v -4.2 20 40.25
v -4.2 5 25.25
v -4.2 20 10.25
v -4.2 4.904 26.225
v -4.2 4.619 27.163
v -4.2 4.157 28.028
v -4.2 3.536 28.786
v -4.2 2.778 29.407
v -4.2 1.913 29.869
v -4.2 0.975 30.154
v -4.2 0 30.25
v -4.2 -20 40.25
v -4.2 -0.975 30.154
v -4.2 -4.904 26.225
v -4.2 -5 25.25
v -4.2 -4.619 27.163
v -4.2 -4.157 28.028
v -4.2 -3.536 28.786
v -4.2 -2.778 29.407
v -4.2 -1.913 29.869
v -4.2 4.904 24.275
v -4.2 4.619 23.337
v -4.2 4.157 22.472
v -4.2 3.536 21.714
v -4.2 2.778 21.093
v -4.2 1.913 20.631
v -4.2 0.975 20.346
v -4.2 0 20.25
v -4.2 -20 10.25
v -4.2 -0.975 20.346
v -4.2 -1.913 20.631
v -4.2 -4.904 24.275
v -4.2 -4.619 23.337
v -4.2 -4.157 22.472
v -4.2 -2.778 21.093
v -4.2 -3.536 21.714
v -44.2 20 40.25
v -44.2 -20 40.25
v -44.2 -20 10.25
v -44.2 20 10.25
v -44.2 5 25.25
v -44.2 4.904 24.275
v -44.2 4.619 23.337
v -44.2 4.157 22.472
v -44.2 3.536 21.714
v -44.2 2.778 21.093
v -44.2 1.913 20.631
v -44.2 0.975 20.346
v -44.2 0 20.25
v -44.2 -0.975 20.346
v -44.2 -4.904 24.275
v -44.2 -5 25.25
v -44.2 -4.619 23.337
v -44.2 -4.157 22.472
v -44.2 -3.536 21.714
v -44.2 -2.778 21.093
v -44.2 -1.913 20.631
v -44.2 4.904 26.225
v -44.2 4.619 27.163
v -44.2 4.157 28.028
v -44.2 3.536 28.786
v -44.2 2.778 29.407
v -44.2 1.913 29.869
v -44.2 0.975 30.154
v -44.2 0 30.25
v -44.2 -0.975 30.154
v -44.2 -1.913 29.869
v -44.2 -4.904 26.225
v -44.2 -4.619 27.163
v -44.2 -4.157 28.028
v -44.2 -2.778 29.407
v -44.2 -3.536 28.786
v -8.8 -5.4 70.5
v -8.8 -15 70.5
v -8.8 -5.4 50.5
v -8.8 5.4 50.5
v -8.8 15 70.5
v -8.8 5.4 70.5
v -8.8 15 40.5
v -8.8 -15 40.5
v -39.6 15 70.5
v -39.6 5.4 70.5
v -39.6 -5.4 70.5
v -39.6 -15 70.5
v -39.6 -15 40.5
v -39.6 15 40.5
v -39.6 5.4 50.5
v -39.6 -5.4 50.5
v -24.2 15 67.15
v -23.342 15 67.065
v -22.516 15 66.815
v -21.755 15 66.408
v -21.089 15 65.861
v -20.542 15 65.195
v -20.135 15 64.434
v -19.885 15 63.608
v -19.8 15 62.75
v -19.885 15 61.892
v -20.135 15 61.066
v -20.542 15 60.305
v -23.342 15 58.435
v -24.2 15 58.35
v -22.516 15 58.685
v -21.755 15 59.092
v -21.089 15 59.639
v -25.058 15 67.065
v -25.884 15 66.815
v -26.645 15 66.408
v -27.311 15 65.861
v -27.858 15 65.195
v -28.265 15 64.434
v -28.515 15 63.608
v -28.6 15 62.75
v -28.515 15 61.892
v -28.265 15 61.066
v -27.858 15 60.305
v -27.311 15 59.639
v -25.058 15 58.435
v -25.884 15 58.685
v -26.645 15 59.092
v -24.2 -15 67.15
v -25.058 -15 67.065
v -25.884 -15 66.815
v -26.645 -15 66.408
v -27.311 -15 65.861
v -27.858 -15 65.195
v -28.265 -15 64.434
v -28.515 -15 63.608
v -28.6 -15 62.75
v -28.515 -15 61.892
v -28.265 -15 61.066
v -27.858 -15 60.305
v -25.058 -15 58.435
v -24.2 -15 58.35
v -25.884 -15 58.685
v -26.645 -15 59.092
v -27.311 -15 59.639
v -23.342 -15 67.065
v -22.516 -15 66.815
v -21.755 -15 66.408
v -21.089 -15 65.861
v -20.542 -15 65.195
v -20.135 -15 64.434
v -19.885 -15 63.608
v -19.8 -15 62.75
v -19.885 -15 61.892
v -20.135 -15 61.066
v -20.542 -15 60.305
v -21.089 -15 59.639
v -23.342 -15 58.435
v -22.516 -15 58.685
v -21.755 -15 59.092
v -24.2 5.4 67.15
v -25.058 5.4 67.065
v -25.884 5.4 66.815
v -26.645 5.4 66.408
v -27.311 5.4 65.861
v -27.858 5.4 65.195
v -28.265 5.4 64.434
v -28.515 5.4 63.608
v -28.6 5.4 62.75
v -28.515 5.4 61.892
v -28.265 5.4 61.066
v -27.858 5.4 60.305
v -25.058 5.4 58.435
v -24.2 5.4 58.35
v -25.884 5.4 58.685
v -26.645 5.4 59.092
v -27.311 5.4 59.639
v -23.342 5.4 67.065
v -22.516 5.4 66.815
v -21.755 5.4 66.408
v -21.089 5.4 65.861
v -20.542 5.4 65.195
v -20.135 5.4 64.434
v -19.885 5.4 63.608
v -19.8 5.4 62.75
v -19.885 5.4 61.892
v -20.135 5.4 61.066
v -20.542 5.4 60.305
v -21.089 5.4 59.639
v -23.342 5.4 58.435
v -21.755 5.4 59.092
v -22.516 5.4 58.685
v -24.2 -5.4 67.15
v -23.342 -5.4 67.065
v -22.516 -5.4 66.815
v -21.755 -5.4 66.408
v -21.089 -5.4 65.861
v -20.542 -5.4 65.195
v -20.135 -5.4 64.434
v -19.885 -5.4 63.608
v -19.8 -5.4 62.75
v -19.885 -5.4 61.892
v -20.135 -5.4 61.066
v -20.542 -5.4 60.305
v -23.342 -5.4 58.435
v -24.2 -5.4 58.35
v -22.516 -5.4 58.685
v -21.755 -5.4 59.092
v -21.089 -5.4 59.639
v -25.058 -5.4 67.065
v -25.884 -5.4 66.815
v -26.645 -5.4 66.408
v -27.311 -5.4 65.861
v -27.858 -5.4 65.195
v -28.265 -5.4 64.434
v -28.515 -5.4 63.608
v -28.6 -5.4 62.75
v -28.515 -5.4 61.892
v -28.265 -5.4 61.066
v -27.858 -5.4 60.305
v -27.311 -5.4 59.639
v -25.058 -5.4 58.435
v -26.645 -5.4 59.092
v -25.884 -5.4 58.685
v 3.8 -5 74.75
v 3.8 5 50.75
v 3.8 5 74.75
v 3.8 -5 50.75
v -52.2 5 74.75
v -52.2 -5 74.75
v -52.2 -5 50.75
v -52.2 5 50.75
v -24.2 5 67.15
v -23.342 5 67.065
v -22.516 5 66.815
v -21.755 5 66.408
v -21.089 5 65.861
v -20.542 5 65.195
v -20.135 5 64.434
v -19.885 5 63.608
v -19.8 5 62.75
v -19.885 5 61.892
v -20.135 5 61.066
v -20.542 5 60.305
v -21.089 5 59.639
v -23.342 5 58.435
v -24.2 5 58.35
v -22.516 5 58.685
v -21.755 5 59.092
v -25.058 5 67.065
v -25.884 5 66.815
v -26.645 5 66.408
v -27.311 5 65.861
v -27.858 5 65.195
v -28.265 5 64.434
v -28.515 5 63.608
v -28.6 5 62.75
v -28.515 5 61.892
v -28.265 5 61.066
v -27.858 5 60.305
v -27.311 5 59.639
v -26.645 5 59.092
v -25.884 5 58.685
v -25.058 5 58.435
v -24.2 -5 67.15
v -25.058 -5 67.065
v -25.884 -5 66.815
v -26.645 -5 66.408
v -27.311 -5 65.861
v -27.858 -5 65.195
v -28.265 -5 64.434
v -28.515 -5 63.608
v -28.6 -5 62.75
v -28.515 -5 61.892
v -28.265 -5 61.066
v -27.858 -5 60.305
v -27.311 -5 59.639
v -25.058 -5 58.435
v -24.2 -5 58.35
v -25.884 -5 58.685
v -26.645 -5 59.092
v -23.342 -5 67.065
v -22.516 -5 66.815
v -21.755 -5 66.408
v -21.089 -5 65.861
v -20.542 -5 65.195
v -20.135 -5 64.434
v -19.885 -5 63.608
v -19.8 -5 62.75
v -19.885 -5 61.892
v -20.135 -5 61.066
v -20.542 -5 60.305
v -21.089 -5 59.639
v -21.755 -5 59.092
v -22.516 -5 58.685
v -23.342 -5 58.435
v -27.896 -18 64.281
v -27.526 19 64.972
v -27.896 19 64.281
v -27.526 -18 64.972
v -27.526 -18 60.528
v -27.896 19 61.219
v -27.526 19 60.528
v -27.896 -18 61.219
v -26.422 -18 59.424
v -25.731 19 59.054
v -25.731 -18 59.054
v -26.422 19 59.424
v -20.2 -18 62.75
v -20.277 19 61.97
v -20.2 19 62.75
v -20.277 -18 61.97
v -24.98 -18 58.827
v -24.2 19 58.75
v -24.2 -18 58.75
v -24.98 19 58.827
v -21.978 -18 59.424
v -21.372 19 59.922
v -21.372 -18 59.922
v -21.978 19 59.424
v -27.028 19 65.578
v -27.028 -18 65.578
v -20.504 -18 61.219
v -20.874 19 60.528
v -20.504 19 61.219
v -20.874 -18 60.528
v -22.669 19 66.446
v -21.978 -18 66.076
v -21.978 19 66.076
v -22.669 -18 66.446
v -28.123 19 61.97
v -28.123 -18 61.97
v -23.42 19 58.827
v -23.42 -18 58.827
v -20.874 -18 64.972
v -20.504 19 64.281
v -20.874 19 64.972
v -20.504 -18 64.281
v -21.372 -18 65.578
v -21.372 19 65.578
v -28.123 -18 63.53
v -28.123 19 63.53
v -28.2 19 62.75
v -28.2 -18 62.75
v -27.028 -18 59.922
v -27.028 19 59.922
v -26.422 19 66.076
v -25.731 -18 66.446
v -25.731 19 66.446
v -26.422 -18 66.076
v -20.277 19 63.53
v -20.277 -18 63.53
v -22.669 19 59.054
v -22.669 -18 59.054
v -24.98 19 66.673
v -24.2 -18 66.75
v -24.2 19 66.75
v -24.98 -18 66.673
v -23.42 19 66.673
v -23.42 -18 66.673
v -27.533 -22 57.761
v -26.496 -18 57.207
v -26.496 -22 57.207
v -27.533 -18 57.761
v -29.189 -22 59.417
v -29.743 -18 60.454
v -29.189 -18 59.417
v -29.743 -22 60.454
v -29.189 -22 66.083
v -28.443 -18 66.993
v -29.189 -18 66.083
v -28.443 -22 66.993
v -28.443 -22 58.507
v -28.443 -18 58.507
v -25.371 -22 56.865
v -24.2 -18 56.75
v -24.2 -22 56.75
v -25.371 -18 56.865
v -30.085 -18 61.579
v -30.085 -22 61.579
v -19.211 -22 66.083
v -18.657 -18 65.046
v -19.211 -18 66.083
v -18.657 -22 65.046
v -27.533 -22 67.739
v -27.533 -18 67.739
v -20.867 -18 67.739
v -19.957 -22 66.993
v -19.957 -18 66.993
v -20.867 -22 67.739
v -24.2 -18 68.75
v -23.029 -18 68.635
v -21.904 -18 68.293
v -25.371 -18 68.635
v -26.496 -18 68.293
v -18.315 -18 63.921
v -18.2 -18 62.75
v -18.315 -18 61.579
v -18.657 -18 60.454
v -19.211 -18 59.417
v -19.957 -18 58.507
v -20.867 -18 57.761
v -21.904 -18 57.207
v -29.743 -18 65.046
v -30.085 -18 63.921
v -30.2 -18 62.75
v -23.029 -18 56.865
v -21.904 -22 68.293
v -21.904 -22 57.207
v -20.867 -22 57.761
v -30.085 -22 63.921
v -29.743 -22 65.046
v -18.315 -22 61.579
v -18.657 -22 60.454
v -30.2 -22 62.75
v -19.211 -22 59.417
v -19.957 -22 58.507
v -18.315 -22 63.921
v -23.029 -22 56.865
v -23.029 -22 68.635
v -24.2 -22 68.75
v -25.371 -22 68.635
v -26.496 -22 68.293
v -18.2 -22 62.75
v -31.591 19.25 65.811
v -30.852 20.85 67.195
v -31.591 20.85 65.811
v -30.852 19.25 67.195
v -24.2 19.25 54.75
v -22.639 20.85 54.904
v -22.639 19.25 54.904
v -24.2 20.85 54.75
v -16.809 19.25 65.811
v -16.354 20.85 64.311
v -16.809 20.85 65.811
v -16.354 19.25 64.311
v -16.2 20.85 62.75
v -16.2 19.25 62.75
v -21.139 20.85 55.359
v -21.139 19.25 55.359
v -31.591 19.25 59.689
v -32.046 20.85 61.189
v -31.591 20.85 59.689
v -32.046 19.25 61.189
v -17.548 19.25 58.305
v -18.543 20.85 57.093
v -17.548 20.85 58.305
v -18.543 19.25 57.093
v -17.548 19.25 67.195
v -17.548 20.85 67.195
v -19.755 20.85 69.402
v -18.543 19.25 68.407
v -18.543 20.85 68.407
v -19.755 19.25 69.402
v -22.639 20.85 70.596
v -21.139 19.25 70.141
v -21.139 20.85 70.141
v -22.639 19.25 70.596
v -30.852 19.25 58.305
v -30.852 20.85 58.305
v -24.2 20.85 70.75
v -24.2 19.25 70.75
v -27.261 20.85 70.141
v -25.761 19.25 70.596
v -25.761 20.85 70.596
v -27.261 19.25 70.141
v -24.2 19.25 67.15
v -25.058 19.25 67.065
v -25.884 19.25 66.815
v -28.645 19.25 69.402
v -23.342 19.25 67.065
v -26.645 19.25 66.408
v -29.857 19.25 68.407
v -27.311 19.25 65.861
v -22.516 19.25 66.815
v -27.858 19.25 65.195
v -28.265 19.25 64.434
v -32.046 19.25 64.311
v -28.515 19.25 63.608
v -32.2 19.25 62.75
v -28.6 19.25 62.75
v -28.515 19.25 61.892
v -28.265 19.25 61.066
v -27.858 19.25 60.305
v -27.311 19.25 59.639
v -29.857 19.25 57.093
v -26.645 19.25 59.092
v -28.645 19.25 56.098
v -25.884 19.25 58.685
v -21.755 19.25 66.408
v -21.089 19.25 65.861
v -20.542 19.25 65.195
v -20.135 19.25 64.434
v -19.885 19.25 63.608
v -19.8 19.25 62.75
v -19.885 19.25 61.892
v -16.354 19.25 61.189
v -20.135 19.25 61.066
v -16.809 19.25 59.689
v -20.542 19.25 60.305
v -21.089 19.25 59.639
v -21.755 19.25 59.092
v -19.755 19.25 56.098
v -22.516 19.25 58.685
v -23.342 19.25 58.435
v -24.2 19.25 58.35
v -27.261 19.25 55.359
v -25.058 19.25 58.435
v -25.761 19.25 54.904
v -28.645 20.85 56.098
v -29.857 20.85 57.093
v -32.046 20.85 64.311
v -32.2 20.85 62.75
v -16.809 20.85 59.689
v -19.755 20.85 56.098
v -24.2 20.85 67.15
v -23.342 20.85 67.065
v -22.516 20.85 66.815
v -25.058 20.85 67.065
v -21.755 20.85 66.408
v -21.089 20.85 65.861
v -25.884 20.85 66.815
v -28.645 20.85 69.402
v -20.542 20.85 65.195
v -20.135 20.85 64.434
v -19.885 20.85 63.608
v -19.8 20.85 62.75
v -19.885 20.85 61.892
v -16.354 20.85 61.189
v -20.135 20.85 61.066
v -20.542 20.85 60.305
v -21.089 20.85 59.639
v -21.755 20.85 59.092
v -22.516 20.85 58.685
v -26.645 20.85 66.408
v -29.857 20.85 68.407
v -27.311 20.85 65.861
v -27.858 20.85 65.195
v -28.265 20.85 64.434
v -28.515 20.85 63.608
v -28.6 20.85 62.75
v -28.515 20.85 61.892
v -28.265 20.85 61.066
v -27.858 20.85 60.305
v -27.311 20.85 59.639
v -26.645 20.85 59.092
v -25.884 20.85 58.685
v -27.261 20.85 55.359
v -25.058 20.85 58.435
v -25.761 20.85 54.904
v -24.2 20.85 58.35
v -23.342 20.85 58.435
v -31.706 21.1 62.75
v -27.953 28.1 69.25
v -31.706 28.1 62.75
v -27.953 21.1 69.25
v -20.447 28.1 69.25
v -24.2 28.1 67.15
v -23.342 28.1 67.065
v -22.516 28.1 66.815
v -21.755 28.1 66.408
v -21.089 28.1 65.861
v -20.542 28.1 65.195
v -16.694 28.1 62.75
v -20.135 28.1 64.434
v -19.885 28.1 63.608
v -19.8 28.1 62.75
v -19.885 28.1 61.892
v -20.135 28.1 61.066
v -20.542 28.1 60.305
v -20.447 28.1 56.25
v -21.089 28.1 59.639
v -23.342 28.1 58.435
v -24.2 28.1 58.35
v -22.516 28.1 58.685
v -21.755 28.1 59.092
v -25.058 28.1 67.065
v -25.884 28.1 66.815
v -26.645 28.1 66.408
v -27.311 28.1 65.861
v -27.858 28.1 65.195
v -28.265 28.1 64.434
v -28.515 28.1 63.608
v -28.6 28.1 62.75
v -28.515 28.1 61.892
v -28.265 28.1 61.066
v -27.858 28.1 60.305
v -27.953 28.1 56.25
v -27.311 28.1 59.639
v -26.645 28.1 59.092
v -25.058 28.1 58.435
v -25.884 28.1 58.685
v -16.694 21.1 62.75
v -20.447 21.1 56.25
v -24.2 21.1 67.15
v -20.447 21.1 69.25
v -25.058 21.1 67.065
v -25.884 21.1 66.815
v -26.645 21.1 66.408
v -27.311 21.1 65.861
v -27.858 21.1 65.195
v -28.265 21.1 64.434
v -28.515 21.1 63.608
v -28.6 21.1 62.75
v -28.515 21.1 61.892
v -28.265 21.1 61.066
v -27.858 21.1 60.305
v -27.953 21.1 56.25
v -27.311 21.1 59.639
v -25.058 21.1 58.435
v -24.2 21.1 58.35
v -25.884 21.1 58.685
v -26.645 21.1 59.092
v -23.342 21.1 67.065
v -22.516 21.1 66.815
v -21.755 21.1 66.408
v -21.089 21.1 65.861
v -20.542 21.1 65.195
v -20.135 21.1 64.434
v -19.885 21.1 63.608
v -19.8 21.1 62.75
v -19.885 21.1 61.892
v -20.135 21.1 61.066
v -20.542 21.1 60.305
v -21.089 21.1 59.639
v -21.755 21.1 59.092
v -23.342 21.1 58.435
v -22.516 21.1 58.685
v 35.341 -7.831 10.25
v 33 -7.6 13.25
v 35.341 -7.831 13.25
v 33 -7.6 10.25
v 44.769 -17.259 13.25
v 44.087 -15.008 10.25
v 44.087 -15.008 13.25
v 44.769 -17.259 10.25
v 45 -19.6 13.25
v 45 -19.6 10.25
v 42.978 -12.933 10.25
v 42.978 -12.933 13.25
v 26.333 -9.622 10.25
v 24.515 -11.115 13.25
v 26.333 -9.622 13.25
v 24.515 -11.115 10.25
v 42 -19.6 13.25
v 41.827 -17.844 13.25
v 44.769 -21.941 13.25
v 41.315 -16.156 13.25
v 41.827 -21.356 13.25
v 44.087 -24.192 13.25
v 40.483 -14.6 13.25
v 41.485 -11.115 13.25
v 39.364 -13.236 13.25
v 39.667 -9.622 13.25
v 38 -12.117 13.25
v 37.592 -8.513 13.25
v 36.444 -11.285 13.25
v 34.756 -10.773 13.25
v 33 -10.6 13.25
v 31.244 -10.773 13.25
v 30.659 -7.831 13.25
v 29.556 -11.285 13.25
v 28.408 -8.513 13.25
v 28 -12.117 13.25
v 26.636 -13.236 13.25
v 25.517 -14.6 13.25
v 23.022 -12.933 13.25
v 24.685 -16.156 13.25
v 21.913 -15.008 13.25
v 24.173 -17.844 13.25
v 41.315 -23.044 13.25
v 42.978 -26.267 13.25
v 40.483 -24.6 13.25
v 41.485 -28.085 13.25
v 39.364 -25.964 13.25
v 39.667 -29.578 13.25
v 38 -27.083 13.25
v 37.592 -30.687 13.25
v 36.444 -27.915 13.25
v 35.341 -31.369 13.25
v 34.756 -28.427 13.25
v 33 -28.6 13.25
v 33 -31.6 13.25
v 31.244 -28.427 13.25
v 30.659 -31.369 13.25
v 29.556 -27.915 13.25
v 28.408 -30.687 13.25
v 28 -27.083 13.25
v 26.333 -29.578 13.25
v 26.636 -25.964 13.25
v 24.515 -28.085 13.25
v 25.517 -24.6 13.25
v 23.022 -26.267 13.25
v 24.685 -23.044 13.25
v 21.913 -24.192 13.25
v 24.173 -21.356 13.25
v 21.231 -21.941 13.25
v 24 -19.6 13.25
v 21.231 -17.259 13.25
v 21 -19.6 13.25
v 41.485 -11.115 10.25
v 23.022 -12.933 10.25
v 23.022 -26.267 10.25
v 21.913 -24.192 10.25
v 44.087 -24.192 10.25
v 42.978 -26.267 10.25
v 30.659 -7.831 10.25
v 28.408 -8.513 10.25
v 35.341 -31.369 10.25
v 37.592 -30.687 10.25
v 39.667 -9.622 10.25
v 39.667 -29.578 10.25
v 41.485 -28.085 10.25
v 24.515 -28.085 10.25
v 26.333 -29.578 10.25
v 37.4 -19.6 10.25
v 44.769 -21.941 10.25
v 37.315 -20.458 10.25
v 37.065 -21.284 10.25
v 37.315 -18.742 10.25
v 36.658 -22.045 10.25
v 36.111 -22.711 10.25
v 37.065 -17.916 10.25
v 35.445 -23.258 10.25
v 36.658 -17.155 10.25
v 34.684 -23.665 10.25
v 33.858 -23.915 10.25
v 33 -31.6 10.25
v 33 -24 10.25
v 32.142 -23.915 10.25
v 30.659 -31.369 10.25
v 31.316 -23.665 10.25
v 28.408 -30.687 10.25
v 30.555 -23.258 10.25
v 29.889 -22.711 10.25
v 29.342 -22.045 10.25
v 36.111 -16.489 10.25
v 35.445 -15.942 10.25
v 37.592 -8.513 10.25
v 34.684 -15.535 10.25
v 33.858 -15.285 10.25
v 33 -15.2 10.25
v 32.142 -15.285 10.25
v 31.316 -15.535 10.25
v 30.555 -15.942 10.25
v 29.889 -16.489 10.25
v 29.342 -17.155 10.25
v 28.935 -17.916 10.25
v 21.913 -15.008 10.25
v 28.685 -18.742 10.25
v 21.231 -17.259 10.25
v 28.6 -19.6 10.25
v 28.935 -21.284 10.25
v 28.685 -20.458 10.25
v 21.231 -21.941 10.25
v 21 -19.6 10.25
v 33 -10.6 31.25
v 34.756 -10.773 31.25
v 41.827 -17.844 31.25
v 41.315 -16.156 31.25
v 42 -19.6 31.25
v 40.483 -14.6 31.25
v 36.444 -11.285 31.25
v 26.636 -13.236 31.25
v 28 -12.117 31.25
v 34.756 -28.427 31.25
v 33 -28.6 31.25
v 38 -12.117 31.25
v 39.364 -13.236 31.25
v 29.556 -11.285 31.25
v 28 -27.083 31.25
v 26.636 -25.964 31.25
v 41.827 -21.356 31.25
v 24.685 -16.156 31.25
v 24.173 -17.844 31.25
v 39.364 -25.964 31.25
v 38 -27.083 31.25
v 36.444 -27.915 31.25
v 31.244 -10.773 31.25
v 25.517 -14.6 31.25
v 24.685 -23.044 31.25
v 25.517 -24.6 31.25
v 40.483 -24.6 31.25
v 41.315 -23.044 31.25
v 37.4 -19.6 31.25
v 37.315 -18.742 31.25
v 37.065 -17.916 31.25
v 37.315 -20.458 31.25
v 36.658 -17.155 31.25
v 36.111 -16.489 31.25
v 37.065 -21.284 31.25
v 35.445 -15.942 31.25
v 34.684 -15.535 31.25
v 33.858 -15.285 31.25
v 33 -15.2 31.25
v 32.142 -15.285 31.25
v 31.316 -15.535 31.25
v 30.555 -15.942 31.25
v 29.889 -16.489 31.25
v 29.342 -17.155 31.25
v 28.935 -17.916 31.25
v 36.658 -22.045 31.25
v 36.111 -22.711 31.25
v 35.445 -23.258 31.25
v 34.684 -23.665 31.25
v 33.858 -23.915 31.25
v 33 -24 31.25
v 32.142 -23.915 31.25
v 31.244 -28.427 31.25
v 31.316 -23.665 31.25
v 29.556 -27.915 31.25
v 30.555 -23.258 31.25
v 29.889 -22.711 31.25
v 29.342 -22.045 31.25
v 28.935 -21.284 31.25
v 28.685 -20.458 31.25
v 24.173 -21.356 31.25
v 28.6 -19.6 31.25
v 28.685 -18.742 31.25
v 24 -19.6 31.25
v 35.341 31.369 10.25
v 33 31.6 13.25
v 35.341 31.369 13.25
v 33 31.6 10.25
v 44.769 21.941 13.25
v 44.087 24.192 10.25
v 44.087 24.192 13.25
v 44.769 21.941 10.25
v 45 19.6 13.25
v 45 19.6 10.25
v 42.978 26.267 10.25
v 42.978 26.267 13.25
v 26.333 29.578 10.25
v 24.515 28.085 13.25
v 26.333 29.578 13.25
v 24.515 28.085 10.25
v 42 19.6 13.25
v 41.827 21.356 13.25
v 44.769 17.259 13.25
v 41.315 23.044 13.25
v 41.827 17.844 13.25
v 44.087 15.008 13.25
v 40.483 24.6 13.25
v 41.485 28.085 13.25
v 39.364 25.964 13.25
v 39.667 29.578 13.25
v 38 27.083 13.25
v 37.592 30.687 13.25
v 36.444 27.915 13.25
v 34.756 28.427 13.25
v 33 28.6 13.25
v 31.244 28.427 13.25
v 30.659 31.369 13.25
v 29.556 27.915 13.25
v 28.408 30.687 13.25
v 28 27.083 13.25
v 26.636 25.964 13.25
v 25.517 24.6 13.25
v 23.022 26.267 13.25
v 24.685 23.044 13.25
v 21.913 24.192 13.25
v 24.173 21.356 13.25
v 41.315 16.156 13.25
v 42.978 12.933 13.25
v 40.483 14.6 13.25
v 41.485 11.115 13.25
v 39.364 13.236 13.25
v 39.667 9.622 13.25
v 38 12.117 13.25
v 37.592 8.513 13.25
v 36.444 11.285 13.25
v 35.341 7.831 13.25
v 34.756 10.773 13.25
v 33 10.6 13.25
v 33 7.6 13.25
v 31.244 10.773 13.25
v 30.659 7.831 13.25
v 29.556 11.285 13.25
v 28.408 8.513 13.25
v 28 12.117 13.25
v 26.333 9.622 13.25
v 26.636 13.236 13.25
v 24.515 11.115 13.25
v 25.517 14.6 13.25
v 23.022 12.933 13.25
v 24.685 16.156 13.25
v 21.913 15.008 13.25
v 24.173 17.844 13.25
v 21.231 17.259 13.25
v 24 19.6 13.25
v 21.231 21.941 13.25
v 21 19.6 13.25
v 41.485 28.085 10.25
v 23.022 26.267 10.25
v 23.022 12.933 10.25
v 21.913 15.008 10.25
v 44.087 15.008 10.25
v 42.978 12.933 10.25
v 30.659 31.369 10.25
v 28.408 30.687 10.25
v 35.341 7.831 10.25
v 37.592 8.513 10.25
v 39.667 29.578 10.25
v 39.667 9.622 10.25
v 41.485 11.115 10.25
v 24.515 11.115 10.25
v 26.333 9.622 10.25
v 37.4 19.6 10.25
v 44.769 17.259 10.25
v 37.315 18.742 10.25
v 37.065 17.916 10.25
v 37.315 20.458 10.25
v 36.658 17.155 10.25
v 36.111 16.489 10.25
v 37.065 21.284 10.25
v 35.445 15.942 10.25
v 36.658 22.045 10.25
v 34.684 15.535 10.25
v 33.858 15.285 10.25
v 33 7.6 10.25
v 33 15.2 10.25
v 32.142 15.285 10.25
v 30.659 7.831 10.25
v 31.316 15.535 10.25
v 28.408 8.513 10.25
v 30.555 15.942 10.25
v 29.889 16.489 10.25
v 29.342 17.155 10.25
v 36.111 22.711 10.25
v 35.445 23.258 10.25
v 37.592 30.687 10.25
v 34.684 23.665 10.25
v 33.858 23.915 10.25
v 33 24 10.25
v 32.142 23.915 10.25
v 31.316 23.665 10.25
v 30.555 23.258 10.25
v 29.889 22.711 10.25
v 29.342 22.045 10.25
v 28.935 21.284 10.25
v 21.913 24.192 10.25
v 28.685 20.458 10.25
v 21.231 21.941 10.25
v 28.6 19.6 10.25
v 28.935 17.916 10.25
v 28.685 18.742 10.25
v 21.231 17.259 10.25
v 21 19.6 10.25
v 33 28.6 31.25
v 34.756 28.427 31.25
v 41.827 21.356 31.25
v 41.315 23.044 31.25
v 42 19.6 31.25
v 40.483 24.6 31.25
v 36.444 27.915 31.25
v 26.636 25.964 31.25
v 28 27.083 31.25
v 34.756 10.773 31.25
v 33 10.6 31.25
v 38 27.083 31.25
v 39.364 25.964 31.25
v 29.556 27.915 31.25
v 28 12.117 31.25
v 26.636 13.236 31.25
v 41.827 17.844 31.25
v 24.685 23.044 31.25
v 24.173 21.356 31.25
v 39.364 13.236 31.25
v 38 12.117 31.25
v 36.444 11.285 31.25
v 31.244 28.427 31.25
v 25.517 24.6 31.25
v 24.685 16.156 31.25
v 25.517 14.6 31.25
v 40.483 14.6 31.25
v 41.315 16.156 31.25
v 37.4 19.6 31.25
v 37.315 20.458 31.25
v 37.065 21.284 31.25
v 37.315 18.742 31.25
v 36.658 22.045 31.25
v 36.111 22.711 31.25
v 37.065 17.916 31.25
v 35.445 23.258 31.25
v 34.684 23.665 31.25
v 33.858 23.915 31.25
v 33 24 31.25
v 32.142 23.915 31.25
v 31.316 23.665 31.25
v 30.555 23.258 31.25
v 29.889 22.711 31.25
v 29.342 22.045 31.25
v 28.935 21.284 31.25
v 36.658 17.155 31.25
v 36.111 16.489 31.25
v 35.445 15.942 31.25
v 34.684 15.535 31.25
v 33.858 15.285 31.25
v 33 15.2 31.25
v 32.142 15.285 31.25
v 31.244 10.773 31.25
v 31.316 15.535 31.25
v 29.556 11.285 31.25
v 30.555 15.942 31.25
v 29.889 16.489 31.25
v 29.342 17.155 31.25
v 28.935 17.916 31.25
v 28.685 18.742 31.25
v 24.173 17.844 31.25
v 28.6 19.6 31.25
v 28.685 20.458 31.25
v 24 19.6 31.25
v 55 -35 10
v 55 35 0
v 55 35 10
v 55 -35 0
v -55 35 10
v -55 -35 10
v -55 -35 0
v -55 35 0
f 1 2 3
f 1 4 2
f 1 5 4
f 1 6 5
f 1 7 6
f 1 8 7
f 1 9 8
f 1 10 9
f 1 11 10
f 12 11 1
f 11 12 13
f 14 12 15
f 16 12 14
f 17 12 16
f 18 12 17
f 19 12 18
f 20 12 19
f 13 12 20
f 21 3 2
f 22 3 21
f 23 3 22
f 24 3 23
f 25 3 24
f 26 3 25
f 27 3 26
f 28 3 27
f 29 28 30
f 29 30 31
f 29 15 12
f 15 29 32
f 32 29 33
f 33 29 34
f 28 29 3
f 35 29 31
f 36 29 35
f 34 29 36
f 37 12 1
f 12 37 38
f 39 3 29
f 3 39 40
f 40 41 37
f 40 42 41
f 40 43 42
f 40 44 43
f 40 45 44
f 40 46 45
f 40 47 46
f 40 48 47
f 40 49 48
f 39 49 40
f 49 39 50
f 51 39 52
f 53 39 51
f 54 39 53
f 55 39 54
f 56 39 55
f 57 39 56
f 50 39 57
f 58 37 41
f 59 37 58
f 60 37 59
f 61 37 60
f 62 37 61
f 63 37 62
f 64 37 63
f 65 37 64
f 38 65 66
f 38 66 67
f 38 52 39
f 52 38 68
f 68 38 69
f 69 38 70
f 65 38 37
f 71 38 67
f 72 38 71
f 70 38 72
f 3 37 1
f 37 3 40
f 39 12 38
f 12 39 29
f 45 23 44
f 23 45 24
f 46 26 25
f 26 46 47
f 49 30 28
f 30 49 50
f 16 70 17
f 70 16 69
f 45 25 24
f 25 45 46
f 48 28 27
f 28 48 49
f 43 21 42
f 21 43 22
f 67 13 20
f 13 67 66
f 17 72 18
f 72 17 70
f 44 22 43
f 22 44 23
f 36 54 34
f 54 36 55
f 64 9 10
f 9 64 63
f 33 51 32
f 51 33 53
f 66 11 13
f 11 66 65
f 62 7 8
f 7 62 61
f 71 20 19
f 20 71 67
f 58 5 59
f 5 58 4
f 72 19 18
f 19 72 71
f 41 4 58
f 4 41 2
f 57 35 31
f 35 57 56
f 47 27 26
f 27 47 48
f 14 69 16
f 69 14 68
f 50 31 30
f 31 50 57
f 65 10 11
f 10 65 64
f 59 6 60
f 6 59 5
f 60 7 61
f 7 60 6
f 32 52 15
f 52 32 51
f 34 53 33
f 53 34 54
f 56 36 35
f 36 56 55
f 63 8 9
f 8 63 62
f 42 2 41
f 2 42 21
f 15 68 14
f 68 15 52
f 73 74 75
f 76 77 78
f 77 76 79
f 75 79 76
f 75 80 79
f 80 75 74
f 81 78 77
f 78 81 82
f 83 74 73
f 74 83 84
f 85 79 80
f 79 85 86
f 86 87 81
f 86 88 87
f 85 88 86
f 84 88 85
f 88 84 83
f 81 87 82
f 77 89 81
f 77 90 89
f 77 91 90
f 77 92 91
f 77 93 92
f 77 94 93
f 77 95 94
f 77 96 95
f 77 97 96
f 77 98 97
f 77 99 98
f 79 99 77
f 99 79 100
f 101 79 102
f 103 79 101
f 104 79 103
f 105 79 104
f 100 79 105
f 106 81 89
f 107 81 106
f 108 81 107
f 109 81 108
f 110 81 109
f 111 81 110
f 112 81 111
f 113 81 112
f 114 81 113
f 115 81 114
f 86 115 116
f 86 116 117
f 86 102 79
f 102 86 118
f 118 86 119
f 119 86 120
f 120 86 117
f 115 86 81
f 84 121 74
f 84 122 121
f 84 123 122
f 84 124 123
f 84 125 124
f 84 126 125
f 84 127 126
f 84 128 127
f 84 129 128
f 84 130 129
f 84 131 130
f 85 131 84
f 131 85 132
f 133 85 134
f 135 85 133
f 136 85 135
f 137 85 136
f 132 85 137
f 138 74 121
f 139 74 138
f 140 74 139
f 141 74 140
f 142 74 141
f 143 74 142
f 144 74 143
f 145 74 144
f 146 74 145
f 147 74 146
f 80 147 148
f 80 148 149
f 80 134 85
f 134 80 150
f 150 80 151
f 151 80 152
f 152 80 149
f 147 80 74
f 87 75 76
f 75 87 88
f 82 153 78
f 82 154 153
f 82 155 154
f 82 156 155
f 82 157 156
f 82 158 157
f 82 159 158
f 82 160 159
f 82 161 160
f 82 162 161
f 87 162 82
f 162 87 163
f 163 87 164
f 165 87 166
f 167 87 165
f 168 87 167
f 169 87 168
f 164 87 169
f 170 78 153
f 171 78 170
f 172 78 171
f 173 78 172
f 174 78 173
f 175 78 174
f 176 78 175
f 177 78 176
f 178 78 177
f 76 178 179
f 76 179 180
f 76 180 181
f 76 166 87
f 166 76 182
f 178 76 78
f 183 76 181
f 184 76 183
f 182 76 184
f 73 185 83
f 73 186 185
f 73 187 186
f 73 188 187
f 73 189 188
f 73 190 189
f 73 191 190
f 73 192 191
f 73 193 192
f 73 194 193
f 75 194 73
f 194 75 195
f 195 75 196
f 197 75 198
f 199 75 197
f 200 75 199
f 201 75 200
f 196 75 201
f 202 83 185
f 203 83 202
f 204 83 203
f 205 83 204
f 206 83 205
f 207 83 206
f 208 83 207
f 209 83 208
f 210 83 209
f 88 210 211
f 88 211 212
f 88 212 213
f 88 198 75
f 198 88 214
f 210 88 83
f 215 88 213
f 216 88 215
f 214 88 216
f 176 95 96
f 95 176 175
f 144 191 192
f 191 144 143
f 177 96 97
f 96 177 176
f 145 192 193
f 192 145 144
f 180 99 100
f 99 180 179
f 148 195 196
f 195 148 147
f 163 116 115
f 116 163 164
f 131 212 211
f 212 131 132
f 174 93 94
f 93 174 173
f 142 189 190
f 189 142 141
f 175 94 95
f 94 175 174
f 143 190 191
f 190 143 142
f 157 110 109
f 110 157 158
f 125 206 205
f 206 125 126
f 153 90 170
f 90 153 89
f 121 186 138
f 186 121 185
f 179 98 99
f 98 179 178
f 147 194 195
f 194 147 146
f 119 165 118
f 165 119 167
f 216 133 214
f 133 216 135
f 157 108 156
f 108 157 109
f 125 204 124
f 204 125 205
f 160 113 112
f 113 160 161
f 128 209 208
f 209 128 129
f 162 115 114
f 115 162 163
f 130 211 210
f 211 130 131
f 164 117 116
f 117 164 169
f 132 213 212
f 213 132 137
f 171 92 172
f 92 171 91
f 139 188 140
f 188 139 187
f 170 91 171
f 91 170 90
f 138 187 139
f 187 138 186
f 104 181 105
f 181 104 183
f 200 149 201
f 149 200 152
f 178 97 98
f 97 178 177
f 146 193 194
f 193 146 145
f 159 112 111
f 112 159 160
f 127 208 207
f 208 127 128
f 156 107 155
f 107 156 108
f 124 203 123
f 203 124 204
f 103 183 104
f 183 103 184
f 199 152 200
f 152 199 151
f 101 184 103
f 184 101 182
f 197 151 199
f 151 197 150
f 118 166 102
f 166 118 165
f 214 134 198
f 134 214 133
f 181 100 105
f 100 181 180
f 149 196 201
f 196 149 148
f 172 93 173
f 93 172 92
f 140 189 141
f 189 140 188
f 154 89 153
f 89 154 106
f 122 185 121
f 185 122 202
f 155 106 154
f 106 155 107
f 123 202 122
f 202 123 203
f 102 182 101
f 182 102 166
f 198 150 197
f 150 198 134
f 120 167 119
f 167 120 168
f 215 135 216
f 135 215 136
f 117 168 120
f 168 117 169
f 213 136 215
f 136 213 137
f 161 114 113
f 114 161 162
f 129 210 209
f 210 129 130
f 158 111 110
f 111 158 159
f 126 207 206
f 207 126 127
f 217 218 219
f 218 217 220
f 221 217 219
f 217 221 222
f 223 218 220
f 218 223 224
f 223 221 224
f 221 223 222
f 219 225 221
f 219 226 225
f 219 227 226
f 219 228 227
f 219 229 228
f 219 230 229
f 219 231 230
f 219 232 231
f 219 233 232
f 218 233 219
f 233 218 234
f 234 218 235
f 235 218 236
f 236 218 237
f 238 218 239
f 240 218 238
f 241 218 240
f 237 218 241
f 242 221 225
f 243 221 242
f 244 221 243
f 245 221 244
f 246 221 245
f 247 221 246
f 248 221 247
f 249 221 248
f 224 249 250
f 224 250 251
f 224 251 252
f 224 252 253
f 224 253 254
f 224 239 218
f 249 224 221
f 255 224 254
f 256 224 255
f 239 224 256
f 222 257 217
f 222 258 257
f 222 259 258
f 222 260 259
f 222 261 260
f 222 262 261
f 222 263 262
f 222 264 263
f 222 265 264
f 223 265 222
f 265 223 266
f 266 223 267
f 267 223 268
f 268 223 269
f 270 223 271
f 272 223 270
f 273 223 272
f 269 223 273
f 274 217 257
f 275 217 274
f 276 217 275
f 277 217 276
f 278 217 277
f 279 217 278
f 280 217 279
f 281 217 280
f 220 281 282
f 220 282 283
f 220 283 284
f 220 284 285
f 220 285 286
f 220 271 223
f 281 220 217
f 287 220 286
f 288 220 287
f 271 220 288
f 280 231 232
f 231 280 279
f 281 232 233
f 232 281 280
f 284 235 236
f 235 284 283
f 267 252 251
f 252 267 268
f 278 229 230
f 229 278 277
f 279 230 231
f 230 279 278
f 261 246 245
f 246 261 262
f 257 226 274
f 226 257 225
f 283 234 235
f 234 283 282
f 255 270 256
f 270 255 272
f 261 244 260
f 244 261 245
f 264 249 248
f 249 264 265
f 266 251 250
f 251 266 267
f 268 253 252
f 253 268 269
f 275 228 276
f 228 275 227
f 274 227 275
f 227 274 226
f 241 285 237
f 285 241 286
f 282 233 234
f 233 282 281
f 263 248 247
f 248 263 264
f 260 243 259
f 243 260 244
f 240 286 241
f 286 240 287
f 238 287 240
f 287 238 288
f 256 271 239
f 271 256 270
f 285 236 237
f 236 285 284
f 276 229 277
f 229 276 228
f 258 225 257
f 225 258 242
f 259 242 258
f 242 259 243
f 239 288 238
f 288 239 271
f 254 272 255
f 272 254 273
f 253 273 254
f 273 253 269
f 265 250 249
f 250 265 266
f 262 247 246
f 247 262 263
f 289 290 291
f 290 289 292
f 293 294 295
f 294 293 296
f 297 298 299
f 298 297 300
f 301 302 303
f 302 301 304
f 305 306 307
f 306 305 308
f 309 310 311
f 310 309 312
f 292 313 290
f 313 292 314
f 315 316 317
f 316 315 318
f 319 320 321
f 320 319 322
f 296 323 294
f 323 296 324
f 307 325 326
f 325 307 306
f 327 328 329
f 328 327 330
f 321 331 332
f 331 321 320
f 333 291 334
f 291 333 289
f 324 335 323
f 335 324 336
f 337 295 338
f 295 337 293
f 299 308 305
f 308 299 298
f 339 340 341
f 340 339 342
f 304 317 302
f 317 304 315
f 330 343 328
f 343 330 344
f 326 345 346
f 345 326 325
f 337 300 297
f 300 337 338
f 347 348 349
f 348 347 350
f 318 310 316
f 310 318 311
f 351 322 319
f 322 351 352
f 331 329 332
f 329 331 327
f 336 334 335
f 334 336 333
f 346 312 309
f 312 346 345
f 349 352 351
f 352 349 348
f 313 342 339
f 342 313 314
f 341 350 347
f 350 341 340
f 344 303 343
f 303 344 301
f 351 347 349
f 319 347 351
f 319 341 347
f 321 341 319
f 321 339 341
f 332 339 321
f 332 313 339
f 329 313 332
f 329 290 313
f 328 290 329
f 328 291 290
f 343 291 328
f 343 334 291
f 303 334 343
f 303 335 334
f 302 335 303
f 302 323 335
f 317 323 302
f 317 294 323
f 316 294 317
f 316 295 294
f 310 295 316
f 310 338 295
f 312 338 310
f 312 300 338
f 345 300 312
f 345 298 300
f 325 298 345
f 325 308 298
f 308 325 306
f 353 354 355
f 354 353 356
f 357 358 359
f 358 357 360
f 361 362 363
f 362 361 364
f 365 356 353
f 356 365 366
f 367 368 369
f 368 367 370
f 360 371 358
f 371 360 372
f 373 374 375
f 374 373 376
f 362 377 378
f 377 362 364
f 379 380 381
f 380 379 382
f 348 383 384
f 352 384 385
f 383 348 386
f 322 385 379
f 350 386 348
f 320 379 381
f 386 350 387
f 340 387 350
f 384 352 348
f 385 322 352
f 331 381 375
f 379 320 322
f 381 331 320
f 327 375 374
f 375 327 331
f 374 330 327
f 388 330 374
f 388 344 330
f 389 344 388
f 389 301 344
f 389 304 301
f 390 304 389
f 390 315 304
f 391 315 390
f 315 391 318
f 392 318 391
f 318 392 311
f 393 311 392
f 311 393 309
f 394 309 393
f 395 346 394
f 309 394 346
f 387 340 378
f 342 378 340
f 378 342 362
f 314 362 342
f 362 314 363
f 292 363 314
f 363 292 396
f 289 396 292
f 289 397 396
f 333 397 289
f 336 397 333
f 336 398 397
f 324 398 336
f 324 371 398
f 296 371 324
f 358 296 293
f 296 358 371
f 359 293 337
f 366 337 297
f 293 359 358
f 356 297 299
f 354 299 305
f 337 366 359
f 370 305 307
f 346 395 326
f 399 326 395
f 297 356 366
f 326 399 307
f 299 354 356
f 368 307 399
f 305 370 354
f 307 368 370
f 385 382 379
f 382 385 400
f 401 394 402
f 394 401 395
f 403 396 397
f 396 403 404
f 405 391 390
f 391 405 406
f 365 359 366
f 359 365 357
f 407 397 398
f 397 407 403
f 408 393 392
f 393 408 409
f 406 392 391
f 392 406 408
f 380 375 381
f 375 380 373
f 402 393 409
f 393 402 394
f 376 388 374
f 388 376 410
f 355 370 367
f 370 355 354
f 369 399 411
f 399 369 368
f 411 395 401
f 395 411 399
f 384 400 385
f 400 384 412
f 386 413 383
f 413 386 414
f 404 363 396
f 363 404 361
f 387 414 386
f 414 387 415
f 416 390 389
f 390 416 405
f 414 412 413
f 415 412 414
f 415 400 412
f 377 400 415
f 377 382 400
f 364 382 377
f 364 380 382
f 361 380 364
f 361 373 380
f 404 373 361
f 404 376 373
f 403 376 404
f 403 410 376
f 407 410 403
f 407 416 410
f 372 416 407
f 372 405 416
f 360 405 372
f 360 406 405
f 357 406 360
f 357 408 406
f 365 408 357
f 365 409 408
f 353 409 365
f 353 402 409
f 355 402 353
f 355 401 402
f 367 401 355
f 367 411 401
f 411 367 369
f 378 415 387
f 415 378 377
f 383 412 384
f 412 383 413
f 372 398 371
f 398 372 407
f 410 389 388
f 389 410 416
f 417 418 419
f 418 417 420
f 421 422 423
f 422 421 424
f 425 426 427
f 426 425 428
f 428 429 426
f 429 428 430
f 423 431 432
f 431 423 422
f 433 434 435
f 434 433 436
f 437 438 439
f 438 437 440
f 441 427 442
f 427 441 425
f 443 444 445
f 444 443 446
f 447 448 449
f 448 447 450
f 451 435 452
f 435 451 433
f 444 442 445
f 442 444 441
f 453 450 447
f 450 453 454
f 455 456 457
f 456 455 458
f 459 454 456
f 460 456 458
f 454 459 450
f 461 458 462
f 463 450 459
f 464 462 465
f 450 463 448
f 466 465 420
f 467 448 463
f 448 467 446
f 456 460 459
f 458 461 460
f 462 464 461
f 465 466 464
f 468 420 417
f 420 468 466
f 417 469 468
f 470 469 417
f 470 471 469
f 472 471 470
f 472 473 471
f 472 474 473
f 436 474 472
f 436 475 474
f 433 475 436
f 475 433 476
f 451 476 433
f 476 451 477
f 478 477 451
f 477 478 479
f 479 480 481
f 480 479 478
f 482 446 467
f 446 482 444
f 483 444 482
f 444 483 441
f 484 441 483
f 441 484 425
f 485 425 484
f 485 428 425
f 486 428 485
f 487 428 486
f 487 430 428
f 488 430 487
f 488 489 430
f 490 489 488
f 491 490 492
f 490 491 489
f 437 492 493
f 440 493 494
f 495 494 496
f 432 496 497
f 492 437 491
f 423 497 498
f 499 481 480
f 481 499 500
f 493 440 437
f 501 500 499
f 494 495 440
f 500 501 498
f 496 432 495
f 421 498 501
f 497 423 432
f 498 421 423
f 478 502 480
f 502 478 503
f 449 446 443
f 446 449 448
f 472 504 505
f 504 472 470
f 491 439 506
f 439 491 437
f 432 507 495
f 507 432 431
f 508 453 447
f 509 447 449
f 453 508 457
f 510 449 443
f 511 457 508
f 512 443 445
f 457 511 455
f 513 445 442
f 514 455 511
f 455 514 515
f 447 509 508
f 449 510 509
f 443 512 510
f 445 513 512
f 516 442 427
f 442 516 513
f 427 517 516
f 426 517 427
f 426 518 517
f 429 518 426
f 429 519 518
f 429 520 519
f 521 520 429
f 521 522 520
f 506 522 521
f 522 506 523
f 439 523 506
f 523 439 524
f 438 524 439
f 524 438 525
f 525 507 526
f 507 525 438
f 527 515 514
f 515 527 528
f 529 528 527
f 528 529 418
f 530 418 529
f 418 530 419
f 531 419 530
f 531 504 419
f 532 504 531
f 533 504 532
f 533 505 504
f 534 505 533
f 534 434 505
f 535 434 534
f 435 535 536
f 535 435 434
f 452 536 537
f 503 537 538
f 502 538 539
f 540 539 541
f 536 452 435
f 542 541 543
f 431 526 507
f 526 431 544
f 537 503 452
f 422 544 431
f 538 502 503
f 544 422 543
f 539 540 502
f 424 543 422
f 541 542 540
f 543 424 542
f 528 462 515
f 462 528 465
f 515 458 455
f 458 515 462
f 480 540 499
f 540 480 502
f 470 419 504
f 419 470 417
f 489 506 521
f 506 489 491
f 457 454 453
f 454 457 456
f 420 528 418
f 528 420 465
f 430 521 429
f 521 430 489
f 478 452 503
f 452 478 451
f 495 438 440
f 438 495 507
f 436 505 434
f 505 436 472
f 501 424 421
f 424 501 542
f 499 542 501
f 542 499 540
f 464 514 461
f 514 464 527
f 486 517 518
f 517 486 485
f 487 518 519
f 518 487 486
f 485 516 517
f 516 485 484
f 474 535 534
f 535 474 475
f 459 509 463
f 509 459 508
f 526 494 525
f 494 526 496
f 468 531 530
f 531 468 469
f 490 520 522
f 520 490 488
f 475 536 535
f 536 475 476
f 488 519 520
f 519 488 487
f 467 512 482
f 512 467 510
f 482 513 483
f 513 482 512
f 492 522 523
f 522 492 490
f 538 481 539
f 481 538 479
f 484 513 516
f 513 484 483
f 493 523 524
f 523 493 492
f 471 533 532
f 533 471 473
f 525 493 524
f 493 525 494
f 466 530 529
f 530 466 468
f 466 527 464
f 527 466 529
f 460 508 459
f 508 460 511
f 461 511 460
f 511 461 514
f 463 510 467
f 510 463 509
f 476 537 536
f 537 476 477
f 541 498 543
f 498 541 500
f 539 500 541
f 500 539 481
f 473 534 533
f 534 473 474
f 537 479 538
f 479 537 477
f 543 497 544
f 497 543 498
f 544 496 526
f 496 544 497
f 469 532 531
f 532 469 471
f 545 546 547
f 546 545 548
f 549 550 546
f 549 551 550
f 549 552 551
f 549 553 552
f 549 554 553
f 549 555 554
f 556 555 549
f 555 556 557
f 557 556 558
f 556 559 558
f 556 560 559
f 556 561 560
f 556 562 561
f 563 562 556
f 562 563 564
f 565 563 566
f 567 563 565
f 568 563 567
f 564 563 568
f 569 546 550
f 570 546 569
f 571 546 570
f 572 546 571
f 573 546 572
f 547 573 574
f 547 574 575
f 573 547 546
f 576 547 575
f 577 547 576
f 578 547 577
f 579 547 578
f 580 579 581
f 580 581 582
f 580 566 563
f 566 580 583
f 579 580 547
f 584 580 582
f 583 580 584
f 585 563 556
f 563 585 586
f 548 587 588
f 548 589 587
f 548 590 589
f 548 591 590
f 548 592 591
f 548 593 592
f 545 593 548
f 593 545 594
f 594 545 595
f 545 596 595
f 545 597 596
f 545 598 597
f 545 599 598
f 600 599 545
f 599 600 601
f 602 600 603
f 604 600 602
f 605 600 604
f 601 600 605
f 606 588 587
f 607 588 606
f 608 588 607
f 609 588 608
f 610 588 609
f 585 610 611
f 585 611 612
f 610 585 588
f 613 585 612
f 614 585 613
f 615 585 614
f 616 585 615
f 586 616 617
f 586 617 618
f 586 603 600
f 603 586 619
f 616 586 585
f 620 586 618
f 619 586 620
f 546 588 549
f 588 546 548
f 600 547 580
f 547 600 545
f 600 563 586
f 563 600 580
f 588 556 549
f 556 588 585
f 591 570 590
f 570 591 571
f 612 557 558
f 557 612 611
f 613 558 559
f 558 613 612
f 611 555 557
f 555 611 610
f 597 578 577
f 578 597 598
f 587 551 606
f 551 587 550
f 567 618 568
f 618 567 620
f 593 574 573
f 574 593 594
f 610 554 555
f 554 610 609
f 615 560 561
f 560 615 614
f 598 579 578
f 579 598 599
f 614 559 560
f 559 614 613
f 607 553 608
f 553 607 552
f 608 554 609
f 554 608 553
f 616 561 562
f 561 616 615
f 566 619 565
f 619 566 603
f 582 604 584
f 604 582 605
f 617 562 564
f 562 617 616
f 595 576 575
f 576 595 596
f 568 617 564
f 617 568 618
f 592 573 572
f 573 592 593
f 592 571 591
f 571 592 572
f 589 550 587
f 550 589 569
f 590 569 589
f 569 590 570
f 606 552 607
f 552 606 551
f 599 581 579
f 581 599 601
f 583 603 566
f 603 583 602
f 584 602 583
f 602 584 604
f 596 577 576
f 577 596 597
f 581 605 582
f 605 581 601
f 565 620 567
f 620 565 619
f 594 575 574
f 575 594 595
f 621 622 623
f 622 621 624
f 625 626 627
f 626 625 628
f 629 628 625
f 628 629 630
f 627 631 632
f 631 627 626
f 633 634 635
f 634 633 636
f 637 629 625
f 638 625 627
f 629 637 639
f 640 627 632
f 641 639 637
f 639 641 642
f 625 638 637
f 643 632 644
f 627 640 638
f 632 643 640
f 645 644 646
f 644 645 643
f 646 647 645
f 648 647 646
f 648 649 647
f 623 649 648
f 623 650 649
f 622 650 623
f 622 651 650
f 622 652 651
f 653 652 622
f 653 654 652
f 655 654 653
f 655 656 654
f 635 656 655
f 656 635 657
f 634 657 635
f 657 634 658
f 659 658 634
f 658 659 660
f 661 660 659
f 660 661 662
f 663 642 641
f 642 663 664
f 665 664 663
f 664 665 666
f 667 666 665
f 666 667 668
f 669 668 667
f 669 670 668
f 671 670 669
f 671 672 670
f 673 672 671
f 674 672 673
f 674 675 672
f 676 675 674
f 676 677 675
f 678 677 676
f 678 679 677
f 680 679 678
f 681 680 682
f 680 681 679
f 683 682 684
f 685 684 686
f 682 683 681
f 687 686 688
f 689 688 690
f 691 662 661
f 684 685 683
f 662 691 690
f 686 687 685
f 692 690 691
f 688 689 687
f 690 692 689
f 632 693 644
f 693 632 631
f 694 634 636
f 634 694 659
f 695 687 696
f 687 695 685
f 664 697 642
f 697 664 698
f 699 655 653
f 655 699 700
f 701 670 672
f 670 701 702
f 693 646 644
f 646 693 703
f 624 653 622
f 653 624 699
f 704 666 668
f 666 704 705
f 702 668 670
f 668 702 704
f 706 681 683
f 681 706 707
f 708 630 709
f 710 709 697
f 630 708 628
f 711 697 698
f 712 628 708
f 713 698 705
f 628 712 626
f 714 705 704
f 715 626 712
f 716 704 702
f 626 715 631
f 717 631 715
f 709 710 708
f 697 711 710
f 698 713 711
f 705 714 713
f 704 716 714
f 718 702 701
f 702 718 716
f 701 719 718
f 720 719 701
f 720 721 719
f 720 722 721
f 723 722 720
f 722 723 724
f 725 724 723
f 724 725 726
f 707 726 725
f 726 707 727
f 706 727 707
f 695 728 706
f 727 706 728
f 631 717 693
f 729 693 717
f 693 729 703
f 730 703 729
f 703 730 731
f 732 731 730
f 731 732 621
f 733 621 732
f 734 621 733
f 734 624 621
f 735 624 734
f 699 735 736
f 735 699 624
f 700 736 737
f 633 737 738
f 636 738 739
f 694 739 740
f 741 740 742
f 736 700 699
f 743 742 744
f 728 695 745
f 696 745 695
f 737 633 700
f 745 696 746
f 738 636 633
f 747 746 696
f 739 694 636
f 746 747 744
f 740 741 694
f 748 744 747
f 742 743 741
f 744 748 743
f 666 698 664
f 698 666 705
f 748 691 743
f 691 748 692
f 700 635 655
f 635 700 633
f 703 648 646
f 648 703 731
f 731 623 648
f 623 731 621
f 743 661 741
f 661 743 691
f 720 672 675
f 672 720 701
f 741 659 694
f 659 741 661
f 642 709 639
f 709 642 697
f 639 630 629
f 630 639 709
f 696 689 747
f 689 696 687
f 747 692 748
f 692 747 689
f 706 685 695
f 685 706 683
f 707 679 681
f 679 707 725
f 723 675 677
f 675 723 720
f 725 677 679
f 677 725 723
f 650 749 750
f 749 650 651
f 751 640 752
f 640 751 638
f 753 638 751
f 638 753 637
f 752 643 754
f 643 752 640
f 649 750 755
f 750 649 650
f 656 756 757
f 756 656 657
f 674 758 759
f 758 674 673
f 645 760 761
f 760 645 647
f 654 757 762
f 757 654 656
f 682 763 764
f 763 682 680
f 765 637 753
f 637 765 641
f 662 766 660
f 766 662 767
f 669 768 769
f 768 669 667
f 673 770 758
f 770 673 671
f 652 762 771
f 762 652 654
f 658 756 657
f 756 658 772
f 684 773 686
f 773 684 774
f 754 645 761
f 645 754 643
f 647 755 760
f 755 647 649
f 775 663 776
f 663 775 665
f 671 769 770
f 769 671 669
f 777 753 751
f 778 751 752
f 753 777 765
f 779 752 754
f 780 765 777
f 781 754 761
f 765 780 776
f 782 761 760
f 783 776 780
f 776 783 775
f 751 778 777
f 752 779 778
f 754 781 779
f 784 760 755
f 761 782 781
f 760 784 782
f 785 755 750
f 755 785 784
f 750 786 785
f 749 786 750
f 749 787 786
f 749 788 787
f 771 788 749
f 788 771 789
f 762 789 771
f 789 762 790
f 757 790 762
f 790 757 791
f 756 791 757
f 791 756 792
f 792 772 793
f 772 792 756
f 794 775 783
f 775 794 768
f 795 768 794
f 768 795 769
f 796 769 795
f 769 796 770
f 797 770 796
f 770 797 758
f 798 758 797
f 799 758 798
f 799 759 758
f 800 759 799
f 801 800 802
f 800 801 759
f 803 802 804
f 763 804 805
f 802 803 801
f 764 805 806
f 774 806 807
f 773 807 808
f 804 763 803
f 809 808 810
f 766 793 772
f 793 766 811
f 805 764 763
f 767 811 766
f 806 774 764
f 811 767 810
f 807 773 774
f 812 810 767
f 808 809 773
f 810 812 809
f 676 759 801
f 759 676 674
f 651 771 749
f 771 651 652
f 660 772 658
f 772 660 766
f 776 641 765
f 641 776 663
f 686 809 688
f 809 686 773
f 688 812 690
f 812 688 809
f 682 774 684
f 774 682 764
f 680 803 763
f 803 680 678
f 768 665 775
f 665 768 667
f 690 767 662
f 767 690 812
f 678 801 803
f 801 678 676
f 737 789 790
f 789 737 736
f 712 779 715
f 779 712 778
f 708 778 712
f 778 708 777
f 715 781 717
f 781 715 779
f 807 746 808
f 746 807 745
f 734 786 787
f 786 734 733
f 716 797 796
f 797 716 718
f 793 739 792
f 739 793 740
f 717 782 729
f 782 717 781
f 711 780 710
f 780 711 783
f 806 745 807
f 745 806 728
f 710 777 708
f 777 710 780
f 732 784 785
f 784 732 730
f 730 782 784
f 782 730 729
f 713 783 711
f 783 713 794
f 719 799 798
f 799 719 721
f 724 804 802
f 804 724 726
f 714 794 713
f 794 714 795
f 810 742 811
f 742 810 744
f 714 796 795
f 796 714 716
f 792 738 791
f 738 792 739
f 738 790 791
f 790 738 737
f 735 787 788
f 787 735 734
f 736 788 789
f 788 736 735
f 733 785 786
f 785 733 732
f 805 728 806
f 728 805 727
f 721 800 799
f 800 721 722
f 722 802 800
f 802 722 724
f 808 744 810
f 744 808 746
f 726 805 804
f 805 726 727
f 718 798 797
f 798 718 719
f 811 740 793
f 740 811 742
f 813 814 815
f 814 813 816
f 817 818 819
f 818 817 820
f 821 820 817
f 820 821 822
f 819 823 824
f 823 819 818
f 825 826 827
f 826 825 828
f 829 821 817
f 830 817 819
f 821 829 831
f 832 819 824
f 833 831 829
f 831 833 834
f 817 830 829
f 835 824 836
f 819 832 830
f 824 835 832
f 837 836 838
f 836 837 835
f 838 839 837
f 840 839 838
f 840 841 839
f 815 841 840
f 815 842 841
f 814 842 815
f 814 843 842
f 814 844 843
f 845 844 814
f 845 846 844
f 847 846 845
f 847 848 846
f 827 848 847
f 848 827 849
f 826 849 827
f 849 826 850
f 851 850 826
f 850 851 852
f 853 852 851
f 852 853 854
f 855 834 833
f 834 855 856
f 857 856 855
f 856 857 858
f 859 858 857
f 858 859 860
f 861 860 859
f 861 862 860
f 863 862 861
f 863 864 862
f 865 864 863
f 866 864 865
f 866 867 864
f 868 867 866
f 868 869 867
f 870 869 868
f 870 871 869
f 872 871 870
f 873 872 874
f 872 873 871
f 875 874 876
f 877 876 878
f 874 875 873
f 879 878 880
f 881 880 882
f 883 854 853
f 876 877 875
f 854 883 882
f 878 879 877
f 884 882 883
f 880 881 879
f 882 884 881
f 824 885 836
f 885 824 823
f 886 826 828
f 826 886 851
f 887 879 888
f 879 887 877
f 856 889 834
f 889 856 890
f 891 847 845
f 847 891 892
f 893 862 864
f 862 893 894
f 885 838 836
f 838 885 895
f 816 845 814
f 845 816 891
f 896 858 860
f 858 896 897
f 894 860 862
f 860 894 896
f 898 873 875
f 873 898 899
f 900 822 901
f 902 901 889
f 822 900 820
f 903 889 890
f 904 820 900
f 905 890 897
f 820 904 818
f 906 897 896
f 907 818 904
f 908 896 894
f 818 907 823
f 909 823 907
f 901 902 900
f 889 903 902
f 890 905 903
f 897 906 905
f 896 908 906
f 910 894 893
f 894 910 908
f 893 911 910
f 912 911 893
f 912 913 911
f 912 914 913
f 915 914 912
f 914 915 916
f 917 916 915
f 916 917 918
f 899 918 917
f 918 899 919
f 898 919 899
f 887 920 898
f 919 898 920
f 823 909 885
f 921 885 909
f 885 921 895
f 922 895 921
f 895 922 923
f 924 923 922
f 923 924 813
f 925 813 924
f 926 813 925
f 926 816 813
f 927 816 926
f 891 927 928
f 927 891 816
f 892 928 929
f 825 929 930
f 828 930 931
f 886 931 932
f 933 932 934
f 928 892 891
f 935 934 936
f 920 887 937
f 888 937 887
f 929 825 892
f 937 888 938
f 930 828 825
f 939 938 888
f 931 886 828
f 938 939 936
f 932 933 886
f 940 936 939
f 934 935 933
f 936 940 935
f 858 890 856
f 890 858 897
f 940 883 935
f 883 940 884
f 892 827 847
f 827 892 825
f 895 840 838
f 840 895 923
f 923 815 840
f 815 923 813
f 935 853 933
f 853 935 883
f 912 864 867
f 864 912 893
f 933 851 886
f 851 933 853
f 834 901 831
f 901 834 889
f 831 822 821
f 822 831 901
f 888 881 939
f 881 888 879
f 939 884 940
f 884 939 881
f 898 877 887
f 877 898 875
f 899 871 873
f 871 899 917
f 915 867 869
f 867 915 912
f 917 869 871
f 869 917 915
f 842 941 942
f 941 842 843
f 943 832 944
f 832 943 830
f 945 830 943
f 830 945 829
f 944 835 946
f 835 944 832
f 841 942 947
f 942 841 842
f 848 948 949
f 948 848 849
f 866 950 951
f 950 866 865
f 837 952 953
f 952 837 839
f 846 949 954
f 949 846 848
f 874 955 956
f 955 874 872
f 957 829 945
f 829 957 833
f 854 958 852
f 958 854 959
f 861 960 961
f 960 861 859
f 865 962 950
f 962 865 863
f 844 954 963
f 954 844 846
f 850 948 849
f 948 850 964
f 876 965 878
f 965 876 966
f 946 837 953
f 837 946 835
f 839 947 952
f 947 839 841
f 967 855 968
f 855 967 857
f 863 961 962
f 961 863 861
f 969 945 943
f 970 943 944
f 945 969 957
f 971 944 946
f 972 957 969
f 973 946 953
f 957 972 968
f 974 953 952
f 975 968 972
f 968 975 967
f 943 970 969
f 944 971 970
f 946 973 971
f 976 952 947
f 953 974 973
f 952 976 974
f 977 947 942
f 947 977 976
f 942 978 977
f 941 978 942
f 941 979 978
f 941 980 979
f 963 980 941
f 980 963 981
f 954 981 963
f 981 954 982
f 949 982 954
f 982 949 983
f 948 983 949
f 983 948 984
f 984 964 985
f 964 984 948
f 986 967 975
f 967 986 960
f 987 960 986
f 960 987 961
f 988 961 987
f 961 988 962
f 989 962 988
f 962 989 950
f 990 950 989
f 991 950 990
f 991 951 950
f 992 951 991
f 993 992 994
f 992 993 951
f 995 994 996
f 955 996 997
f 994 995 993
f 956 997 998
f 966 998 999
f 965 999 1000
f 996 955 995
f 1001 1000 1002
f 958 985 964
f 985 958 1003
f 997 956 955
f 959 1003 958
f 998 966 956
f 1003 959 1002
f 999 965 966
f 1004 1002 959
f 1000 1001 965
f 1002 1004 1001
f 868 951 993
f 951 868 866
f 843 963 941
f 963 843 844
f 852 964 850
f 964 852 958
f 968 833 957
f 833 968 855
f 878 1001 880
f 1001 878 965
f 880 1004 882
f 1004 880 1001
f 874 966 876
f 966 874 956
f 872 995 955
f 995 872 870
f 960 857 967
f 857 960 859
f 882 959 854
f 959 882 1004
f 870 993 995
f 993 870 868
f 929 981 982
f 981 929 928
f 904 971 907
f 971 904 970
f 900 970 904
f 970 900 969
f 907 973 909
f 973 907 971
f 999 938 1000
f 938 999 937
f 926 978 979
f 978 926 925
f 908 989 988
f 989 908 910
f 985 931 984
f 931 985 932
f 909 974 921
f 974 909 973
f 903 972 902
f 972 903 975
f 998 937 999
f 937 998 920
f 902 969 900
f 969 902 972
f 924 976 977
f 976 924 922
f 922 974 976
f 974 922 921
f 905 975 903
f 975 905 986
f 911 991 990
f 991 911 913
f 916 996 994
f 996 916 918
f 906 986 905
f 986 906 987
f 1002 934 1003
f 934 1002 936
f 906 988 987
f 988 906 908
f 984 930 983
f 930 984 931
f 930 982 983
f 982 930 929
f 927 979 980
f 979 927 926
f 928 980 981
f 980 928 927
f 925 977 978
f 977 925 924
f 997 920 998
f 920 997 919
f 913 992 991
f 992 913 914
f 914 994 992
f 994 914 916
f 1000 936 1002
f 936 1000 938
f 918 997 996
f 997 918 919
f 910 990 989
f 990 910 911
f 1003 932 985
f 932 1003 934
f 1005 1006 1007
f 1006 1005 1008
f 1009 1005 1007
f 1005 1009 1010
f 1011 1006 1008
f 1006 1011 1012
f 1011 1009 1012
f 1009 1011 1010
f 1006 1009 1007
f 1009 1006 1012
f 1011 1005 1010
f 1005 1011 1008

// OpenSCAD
$fn = 32;

// ------------------------------------------------------------------------
// Indexing jig: plate 110 x 70 mm, pin d8
// Every part is its own module, assembly() places every instance.
// ------------------------------------------------------------------------

// --- part 1 ---
module jig_plate() {
  difference() {
    translate([-55, -35, 0]) cube([110, 70, 10]);
  }
}

// --- part 2 ---
module locator_block() {
  difference() {
    translate([-20, -20, 0]) cube([40, 40, 30]);
    translate([0, 0, 15]) rotate([0, 90, 0]) cylinder(h = 42, d = 10, center = true);
  }
}

// --- part 3 ---
module index_fork() {
  difference() {
    translate([-15.4, -15, 0]) cube([30.8, 30, 30]);
    translate([-16.4, -5.4, 10]) cube([32.8, 10.8, 21]);
    translate([0, 0, 22.25]) rotate([90, 0, 0]) cylinder(h = 32, d = 8.8, center = true);
  }
}

// --- part 4 ---
module index_arm() {
  difference() {
    translate([-28, -5, 0]) cube([56, 10, 24]);
    translate([0, 0, 12]) rotate([90, 0, 0]) cylinder(h = 12, d = 8.8, center = true);
  }
}

// --- part 5 ---
module index_pin() {
  rotate([0, 90, 0]) cylinder(h = 38, d = 8, center = true);
  translate([-22, 0, 0]) rotate([0, 90, 0]) cylinder(h = 4, d = 12);
}

// --- part 6 ---
module pin_washer() {
  difference() {
      translate([0, 0, 0]) cylinder(h = 1.6, d = 16);
      translate([0, 0, -1]) cylinder(h = 3.6, d = 8.8);
    }
}

// --- part 7 ---
module lock_nut() {
  difference() {
    linear_extrude(height = 7) polygon(points = [[7.506, 0], [3.753, 6.5], [-3.753, 6.5], [-7.506, 0], [-3.753, -6.5], [3.753, -6.5]]);
    translate([0, 0, -1]) cylinder(h = 9, d = 8.8);
  }
}

// --- part 8 ---
module guide_bush_a() {
  difference() {
    union() {
      cylinder(h = 3, d = 24);
      translate([0, 0, 3]) cylinder(h = 18, d = 18);
    }
    translate([0, 0, -1]) cylinder(h = 23, d = 8.8);
  }
}

// --- part 9 ---
module guide_bush_b() {
  difference() {
    union() {
      cylinder(h = 3, d = 24);
      translate([0, 0, 3]) cylinder(h = 18, d = 18);
    }
    translate([0, 0, -1]) cylinder(h = 23, d = 8.8);
  }
}

// --- assembly ---
module assembly() {
  color([0.80, 0.24, 0.20]) translate([0, 0, 0]) rotate([0, 0, 0]) jig_plate();
  color([0.20, 0.45, 0.75]) translate([-24.2, 0, 10.25]) rotate([0, 0, 0]) locator_block();
  color([0.25, 0.62, 0.32]) translate([-24.2, 0, 40.5]) rotate([0, 0, 0]) index_fork();
  color([0.92, 0.70, 0.18]) translate([-24.2, 0, 50.75]) rotate([0, 0, 0]) index_arm();
  color([0.58, 0.35, 0.70]) translate([-24.2, 0, 62.75]) rotate([0, 0, 90]) index_pin();
  color([0.16, 0.66, 0.66]) translate([-24.2, 20.85, 62.75]) rotate([90, 0, 0]) pin_washer();
  color([0.85, 0.48, 0.18]) translate([-24.2, 28.1, 62.75]) rotate([90, 0, 0]) lock_nut();
  color([0.55, 0.60, 0.65]) translate([33, -19.6, 10.25]) rotate([0, 0, 0]) guide_bush_a();
  color([0.75, 0.30, 0.55]) translate([33, 19.6, 10.25]) rotate([0, 0, 0]) guide_bush_b();
}

assembly();
